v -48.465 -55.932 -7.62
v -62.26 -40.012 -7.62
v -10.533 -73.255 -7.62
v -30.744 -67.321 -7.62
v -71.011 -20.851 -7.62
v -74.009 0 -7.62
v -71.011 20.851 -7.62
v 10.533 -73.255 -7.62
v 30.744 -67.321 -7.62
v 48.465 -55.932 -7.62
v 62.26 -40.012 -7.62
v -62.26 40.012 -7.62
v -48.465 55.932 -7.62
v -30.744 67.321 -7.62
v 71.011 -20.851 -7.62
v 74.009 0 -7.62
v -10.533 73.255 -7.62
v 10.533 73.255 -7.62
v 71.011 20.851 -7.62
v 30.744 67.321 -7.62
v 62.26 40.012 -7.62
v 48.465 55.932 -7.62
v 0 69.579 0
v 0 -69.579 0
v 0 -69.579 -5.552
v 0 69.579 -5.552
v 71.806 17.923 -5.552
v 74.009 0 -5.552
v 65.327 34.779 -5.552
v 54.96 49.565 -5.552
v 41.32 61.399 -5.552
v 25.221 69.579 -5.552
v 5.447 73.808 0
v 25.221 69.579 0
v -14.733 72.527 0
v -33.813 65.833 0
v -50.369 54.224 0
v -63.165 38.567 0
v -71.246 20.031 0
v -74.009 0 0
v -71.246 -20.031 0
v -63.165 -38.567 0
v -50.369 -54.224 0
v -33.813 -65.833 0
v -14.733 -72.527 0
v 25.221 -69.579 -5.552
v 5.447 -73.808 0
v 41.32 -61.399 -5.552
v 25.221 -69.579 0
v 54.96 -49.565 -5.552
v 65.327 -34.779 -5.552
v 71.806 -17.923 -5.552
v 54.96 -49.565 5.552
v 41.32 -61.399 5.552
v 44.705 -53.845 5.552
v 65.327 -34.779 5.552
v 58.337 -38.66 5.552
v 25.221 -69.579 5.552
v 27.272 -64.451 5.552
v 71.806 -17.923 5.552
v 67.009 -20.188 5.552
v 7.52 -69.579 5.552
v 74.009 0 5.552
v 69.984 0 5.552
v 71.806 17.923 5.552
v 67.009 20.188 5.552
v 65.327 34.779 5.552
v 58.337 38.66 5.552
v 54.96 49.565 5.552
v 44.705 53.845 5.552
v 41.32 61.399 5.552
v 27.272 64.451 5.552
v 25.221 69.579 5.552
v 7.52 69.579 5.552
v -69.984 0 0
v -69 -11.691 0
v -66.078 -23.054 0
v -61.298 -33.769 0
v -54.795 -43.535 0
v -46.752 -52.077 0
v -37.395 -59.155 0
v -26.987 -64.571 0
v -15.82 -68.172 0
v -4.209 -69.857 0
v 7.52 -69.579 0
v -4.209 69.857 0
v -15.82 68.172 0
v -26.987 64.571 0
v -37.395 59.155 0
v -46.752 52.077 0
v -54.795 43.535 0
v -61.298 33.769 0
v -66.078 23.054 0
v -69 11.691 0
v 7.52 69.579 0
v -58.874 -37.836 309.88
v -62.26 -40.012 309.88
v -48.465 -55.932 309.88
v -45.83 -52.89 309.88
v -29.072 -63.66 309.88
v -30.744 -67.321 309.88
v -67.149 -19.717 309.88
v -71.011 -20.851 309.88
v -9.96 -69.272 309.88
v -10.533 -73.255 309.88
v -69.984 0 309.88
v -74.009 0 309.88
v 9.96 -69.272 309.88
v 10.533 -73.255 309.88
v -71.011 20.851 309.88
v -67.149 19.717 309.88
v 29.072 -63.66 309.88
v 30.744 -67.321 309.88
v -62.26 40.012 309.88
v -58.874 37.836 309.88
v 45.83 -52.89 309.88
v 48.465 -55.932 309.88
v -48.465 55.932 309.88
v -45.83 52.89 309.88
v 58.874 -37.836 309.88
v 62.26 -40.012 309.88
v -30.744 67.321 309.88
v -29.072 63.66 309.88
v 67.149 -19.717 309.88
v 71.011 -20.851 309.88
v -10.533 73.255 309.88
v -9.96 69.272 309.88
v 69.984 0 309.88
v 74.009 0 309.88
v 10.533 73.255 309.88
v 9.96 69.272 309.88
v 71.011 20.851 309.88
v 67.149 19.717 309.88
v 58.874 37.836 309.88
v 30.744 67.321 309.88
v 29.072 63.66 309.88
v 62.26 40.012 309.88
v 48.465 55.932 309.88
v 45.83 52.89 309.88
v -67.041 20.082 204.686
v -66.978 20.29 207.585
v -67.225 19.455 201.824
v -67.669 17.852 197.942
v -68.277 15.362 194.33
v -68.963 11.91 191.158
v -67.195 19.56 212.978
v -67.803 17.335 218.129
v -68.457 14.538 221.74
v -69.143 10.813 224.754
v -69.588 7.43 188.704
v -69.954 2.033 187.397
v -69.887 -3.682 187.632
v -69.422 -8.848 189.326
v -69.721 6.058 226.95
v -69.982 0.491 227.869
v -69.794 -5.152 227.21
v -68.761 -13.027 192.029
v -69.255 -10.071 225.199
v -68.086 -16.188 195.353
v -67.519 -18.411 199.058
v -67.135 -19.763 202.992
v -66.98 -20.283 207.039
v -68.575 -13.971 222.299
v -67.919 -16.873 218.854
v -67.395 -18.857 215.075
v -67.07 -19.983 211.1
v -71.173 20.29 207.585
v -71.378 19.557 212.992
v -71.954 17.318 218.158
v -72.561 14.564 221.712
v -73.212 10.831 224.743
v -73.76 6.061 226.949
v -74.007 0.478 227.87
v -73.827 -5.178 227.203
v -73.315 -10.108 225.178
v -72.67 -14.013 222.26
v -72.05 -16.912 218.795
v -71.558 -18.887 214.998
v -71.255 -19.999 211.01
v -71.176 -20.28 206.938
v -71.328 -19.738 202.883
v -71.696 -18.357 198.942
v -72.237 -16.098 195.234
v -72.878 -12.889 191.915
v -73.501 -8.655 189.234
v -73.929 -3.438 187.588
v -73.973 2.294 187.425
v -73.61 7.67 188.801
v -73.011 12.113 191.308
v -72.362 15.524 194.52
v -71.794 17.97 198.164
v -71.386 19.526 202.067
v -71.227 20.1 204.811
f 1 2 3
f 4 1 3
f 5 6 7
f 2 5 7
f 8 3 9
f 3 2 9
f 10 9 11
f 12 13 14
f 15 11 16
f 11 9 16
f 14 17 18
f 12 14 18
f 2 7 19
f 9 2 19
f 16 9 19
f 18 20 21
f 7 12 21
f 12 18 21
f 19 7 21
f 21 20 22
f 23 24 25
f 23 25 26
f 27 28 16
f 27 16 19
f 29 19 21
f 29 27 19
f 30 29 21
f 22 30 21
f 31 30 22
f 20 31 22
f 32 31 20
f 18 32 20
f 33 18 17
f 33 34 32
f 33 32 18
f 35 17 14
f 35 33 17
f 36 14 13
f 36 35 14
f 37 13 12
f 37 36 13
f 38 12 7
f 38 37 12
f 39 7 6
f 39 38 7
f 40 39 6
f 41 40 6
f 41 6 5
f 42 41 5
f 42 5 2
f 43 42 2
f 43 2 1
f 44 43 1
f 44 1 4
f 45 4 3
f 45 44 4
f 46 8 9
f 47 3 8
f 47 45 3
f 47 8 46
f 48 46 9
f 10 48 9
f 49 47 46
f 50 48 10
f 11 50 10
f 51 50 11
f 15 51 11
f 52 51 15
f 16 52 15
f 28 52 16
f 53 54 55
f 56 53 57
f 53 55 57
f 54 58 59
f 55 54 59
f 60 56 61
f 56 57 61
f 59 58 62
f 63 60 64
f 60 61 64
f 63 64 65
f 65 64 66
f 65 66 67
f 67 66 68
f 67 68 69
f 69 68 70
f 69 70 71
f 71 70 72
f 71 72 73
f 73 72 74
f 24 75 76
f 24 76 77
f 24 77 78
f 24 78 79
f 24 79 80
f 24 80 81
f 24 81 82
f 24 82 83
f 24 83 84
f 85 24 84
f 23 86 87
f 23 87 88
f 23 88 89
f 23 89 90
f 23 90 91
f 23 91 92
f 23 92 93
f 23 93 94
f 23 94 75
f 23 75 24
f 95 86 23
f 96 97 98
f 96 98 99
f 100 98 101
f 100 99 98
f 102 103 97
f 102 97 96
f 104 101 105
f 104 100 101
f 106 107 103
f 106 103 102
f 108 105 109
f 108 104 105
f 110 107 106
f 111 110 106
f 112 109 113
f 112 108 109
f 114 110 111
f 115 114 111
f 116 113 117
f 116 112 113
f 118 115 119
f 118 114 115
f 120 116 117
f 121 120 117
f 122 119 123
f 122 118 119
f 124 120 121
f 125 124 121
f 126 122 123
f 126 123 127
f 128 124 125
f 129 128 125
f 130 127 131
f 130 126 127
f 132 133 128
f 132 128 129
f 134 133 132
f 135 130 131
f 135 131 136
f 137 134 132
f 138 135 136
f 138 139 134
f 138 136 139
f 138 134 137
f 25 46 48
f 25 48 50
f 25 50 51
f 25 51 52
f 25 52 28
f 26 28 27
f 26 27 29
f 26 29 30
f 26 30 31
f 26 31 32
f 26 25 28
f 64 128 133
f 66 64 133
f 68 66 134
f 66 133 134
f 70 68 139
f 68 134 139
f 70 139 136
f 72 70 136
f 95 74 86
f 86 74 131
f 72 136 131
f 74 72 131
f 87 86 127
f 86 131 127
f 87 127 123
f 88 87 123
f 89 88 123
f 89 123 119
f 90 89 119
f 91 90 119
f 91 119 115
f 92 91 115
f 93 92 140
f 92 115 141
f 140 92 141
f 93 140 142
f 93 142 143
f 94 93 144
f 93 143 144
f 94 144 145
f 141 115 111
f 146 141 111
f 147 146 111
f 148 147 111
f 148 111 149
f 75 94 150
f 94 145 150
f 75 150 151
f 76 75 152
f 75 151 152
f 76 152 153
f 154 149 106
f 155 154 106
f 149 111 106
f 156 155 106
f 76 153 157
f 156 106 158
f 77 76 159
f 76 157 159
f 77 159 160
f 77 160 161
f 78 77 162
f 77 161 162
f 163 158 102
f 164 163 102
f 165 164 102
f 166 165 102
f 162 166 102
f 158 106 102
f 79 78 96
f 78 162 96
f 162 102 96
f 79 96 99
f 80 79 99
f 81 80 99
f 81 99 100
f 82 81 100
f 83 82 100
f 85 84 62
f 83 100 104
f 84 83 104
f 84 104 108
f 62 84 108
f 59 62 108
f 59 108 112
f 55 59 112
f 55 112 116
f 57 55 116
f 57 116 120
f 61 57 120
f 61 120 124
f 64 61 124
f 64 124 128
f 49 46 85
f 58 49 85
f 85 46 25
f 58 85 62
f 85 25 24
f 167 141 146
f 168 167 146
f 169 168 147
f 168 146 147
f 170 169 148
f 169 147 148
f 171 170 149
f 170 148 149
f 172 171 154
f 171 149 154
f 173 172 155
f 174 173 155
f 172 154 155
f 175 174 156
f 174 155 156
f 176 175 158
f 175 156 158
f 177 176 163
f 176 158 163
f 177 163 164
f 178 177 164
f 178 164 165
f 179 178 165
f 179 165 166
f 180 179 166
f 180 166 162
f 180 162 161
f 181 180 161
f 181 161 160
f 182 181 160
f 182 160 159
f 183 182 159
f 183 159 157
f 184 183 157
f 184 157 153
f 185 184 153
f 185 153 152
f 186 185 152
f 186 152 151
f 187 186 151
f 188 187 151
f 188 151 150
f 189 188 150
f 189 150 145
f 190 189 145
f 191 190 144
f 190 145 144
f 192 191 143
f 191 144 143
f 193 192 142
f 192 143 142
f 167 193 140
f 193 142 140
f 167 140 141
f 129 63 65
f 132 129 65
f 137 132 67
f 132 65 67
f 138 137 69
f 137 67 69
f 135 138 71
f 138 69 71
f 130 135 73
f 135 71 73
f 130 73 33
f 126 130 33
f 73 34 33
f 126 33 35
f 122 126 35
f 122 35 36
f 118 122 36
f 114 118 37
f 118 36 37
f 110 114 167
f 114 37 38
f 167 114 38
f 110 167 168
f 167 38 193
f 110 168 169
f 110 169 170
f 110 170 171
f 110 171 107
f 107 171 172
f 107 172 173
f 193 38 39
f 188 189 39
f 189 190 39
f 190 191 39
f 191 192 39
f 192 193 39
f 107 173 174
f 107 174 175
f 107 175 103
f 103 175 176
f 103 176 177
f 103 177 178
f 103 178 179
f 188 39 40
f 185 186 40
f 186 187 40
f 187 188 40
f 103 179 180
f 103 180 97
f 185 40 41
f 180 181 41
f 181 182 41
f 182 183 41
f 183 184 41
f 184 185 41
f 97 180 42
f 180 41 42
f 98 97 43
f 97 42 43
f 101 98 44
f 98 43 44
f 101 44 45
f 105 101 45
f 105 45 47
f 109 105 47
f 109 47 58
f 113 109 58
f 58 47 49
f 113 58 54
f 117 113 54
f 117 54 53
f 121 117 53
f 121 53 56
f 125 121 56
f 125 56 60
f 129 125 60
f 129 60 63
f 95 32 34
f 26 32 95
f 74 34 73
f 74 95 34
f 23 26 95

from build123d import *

# Parameters (mm, degrees)
F0_R     = 74.008628
F1_DEPTH = 309.88
F2_R     = 69.983842
F3_DEPTH = 415.798
F4_R     = 20.290175
F5_DEPTH = 138.938
F6_DEPTH = 7.62
F7_W     = 139.15725
F7_H     = 11.103896
F8_DEPTH = 97.282


with BuildPart() as f1:
    # F0 (on Top) → F1 (new body)
    with BuildSketch(Plane.XY):
        Circle(F0_R)
    extrude(amount=F1_DEPTH)

    # F2 (on face) → F3 (cut)
    with BuildSketch(Plane.XY.offset(309.88)):
        Circle(F2_R)
    extrude(amount=-F3_DEPTH, mode=Mode.SUBTRACT)

    # F4 (on Right) → F5 (cut)
    with BuildSketch(Plane.YZ):
        with Locations((0, 207.585201)):
            Circle(F4_R)
    extrude(amount=-F5_DEPTH, mode=Mode.SUBTRACT)

    # F0 (on Top) → F6 (join)
    with BuildSketch(Plane.XY):
        Circle(F0_R)
    extrude(amount=-F6_DEPTH)

    # F7 (on Right) → F8 (cut)
    with BuildSketch(Plane.YZ):
        Rectangle(F7_W, F7_H)
    extrude(amount=F8_DEPTH, mode=Mode.SUBTRACT)


solid = f1.part
